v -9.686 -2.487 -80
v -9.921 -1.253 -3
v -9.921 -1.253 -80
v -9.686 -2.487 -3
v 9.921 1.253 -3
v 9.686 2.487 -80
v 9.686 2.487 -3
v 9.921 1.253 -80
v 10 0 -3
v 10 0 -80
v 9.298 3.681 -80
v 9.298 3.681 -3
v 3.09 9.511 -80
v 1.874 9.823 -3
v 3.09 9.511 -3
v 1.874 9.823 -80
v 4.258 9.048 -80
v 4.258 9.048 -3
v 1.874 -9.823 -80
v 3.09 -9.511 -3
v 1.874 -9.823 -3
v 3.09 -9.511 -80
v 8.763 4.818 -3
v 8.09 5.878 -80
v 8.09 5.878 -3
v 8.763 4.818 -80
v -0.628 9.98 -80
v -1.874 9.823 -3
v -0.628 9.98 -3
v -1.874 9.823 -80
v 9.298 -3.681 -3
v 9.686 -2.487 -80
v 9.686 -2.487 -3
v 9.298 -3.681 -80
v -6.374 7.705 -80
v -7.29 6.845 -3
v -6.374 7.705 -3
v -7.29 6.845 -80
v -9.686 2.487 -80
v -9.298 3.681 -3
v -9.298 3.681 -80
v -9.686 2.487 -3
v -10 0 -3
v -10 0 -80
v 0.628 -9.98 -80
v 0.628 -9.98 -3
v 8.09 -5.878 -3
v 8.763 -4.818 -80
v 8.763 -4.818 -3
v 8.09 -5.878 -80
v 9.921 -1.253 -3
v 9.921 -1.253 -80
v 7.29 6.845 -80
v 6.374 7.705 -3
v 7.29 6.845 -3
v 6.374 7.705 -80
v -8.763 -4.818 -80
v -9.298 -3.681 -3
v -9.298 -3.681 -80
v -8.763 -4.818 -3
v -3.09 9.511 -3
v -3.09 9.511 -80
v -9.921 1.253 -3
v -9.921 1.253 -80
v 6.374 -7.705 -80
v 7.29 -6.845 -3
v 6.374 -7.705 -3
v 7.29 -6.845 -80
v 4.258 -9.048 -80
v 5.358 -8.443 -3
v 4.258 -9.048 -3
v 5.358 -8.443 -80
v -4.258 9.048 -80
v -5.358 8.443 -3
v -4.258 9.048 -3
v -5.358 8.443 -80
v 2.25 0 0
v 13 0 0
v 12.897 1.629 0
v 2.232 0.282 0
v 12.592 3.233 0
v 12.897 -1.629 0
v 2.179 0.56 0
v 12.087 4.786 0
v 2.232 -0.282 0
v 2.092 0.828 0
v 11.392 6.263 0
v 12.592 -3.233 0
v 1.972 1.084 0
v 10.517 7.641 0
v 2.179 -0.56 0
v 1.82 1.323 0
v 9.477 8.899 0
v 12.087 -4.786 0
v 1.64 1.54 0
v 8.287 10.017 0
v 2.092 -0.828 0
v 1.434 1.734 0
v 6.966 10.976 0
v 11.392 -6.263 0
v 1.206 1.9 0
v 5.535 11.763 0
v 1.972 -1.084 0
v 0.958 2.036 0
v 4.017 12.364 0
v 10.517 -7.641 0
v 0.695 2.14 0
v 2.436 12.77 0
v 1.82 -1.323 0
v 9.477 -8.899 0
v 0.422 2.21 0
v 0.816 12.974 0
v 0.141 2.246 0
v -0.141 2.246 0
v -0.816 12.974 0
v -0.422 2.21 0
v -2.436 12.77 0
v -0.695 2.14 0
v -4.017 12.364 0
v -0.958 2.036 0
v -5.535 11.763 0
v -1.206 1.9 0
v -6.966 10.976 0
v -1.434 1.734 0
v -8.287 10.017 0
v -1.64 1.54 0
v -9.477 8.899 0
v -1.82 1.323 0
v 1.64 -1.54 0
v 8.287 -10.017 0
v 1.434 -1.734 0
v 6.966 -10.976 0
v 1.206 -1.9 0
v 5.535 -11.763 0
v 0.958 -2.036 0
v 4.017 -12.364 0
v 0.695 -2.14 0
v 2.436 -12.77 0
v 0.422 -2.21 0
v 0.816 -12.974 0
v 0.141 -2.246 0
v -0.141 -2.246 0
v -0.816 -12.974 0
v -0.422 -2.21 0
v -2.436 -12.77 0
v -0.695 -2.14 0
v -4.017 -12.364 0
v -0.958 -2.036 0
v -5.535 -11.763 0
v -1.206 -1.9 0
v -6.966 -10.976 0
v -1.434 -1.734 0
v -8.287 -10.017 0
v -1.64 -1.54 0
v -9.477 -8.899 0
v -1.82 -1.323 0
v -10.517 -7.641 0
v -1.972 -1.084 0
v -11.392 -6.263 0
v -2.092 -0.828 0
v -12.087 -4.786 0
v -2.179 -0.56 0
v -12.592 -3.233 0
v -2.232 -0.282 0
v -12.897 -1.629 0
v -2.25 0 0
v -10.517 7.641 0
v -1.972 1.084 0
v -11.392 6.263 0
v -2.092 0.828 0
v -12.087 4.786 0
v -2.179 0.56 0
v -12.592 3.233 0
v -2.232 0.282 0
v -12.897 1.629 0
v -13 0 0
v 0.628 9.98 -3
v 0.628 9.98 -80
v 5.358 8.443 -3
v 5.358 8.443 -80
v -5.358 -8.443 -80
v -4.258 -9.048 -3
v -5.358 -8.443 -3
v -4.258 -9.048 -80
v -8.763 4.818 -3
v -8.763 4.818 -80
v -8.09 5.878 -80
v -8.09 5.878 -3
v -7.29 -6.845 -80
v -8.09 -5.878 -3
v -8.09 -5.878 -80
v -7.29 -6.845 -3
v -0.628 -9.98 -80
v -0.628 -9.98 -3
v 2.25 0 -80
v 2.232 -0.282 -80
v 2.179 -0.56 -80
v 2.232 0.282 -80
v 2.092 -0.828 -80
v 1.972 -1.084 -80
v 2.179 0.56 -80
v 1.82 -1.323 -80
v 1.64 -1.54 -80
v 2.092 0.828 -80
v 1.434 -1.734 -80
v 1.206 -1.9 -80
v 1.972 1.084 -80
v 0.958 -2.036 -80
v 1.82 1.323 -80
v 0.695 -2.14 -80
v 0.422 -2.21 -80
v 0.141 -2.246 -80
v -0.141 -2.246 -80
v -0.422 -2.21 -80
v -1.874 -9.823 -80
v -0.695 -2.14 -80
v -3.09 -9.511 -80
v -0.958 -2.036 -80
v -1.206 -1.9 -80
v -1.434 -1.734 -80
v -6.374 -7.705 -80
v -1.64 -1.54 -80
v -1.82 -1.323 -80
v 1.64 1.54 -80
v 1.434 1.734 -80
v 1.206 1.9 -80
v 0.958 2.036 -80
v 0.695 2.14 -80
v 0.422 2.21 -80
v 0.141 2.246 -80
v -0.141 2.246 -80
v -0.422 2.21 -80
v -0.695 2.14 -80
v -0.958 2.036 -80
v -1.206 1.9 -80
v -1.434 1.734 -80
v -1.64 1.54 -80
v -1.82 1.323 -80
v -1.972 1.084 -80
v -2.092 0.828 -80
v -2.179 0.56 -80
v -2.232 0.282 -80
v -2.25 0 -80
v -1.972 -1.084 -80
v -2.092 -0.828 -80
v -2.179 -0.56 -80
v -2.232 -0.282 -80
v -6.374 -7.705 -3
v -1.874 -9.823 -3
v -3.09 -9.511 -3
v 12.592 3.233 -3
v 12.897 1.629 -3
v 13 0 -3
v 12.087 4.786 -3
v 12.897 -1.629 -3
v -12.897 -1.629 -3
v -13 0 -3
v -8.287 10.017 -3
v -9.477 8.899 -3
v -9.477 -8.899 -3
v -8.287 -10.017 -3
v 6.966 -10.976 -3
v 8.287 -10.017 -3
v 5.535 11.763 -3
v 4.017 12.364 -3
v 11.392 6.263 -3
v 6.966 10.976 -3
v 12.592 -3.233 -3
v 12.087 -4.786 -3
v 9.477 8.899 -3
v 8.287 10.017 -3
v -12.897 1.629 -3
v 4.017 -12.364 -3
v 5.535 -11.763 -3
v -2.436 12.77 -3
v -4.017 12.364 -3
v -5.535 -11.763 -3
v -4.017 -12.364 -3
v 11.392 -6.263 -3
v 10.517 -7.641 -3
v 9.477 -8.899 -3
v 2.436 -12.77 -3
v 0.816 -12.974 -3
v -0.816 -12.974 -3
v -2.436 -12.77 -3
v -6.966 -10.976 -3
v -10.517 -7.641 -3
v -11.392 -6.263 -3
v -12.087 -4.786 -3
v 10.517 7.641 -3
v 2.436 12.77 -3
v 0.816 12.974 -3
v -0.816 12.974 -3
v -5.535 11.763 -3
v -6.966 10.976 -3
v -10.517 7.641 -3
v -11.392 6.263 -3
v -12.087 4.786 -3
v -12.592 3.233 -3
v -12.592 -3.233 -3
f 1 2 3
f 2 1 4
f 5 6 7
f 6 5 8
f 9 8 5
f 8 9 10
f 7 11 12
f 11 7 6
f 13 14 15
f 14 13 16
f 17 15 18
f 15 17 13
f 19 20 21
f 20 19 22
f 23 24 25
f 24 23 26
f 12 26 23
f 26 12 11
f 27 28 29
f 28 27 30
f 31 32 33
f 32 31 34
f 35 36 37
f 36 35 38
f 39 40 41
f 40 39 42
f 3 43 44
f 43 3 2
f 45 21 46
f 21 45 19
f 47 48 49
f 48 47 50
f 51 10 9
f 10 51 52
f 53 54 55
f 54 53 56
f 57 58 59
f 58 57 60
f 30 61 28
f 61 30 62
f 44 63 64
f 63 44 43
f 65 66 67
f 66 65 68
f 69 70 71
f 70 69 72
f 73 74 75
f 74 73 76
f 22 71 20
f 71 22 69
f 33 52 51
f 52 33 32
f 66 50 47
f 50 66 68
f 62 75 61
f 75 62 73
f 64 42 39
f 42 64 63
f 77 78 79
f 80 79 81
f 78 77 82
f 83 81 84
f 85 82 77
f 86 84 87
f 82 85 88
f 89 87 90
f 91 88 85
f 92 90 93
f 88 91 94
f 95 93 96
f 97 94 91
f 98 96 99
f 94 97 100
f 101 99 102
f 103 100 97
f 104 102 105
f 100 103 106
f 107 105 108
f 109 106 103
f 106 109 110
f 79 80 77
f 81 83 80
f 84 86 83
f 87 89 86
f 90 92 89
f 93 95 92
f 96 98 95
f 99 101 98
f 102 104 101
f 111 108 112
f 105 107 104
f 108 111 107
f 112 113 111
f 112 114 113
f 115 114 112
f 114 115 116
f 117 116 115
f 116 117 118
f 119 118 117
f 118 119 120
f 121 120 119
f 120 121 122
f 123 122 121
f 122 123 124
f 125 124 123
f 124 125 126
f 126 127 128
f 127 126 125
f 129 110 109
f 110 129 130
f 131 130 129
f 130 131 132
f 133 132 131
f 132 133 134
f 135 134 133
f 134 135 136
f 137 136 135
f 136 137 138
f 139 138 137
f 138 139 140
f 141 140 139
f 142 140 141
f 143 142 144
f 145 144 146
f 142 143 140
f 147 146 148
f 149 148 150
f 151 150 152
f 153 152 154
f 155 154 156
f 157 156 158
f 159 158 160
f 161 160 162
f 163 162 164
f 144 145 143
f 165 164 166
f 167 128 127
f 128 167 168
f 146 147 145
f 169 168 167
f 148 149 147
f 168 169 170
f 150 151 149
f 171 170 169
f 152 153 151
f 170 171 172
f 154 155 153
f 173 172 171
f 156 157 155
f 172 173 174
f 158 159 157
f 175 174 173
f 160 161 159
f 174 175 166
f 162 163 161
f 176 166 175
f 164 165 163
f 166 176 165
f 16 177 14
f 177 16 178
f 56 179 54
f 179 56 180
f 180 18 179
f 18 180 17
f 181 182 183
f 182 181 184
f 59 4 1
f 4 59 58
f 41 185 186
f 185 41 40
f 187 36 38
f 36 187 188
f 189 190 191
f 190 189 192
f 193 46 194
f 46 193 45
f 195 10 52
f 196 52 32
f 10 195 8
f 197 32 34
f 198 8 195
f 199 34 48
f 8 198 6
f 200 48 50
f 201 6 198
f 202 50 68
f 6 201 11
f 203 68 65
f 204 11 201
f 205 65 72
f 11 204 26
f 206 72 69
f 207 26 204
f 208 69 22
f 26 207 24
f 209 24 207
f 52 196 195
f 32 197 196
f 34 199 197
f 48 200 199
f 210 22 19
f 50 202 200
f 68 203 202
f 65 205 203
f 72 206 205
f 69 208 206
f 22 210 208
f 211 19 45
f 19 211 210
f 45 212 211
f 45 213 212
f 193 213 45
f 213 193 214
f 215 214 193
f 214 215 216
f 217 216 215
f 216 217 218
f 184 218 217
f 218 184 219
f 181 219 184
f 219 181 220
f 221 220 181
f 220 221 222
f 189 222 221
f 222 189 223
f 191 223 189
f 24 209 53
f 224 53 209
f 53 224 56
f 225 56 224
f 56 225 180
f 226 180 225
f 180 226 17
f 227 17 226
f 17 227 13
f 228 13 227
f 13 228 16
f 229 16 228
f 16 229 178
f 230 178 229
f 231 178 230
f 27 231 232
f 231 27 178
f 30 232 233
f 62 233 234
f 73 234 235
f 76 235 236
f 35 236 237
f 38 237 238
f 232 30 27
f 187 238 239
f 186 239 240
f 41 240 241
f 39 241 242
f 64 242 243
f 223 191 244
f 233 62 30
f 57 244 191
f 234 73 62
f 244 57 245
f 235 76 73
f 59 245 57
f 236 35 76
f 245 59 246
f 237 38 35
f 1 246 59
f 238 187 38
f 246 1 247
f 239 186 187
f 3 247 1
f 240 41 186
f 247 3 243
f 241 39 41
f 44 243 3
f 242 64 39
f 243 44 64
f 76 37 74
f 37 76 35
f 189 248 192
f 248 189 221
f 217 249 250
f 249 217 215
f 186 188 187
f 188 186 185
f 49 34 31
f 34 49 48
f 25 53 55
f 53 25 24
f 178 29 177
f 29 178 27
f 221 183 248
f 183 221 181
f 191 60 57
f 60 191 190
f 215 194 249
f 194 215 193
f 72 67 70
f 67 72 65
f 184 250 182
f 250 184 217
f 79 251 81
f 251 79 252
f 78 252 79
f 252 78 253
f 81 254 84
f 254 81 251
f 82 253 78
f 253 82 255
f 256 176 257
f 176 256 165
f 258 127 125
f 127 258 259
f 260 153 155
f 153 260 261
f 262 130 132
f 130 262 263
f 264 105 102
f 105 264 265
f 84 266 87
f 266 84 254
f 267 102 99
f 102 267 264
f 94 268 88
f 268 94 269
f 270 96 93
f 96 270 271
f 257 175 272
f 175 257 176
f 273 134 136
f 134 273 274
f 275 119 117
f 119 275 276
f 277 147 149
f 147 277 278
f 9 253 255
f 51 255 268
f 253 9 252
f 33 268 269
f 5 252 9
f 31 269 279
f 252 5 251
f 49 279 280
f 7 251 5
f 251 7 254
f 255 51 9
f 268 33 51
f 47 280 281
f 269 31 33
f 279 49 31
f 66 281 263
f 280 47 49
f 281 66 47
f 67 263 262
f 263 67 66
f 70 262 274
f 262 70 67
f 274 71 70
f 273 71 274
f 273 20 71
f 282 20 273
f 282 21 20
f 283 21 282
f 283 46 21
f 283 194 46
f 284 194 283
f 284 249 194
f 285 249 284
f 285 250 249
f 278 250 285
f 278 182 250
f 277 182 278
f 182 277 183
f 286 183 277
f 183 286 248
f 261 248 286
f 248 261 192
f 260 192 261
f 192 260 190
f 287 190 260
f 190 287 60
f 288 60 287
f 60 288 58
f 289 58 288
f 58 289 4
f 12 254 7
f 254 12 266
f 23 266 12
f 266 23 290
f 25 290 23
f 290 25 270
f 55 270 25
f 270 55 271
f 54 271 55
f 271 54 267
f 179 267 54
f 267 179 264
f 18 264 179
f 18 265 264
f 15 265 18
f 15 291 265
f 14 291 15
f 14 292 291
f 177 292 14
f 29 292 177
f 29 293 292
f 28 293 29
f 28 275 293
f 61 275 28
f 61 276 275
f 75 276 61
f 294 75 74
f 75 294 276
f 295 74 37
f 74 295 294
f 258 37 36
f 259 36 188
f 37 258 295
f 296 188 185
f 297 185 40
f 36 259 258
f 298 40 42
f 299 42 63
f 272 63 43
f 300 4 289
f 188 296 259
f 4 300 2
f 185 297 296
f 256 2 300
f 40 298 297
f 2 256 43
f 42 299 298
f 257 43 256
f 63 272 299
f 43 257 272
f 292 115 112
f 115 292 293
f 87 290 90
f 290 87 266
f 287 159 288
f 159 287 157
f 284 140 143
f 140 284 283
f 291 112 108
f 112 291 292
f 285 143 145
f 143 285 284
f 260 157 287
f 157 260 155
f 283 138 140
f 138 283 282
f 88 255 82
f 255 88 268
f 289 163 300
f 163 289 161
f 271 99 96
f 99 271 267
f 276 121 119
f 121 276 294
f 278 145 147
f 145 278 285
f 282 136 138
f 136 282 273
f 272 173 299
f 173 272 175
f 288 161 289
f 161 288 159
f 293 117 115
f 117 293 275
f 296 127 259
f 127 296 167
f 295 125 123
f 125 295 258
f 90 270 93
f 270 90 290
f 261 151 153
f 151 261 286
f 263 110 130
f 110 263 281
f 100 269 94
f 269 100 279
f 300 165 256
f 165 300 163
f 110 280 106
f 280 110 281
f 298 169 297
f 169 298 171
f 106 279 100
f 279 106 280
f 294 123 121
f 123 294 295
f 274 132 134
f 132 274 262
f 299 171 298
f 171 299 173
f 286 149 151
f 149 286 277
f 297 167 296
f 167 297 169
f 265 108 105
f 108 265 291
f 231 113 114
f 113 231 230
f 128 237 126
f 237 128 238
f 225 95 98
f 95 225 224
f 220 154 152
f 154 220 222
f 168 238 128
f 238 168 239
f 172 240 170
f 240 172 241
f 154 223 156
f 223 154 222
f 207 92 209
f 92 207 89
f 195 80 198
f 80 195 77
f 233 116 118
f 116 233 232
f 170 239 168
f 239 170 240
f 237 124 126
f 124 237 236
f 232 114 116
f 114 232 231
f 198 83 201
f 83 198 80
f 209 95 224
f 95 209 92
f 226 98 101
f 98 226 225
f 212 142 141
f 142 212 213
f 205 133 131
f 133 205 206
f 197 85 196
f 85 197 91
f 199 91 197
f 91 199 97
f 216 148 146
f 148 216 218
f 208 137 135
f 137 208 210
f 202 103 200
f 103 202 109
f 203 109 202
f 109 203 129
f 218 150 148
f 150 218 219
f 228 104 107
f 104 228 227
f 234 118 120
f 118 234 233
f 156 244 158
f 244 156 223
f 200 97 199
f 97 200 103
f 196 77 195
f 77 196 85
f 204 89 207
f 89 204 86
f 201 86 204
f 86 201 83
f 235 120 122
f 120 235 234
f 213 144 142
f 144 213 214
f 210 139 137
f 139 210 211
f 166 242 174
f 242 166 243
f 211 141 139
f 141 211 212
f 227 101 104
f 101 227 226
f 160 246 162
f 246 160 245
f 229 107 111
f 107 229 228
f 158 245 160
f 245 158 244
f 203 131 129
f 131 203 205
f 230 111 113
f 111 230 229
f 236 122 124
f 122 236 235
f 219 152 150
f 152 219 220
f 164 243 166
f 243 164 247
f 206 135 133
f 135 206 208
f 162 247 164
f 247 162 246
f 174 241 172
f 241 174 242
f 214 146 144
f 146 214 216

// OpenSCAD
$fn = 50;


difference() {
	union() {
		translate(v = [0, 0, -80.0000000000]) {
			cylinder(h = 80, r = 10.0000000000);
		}
		translate(v = [0, 0, -3.0000000000]) {
			cylinder(h = 3, r = 13.0000000000);
		}
	}
	union() {
		#translate(v = [0, 0, -80]) {
			cylinder(h = 80, r = 2.2500000000);
		}
	}
}
